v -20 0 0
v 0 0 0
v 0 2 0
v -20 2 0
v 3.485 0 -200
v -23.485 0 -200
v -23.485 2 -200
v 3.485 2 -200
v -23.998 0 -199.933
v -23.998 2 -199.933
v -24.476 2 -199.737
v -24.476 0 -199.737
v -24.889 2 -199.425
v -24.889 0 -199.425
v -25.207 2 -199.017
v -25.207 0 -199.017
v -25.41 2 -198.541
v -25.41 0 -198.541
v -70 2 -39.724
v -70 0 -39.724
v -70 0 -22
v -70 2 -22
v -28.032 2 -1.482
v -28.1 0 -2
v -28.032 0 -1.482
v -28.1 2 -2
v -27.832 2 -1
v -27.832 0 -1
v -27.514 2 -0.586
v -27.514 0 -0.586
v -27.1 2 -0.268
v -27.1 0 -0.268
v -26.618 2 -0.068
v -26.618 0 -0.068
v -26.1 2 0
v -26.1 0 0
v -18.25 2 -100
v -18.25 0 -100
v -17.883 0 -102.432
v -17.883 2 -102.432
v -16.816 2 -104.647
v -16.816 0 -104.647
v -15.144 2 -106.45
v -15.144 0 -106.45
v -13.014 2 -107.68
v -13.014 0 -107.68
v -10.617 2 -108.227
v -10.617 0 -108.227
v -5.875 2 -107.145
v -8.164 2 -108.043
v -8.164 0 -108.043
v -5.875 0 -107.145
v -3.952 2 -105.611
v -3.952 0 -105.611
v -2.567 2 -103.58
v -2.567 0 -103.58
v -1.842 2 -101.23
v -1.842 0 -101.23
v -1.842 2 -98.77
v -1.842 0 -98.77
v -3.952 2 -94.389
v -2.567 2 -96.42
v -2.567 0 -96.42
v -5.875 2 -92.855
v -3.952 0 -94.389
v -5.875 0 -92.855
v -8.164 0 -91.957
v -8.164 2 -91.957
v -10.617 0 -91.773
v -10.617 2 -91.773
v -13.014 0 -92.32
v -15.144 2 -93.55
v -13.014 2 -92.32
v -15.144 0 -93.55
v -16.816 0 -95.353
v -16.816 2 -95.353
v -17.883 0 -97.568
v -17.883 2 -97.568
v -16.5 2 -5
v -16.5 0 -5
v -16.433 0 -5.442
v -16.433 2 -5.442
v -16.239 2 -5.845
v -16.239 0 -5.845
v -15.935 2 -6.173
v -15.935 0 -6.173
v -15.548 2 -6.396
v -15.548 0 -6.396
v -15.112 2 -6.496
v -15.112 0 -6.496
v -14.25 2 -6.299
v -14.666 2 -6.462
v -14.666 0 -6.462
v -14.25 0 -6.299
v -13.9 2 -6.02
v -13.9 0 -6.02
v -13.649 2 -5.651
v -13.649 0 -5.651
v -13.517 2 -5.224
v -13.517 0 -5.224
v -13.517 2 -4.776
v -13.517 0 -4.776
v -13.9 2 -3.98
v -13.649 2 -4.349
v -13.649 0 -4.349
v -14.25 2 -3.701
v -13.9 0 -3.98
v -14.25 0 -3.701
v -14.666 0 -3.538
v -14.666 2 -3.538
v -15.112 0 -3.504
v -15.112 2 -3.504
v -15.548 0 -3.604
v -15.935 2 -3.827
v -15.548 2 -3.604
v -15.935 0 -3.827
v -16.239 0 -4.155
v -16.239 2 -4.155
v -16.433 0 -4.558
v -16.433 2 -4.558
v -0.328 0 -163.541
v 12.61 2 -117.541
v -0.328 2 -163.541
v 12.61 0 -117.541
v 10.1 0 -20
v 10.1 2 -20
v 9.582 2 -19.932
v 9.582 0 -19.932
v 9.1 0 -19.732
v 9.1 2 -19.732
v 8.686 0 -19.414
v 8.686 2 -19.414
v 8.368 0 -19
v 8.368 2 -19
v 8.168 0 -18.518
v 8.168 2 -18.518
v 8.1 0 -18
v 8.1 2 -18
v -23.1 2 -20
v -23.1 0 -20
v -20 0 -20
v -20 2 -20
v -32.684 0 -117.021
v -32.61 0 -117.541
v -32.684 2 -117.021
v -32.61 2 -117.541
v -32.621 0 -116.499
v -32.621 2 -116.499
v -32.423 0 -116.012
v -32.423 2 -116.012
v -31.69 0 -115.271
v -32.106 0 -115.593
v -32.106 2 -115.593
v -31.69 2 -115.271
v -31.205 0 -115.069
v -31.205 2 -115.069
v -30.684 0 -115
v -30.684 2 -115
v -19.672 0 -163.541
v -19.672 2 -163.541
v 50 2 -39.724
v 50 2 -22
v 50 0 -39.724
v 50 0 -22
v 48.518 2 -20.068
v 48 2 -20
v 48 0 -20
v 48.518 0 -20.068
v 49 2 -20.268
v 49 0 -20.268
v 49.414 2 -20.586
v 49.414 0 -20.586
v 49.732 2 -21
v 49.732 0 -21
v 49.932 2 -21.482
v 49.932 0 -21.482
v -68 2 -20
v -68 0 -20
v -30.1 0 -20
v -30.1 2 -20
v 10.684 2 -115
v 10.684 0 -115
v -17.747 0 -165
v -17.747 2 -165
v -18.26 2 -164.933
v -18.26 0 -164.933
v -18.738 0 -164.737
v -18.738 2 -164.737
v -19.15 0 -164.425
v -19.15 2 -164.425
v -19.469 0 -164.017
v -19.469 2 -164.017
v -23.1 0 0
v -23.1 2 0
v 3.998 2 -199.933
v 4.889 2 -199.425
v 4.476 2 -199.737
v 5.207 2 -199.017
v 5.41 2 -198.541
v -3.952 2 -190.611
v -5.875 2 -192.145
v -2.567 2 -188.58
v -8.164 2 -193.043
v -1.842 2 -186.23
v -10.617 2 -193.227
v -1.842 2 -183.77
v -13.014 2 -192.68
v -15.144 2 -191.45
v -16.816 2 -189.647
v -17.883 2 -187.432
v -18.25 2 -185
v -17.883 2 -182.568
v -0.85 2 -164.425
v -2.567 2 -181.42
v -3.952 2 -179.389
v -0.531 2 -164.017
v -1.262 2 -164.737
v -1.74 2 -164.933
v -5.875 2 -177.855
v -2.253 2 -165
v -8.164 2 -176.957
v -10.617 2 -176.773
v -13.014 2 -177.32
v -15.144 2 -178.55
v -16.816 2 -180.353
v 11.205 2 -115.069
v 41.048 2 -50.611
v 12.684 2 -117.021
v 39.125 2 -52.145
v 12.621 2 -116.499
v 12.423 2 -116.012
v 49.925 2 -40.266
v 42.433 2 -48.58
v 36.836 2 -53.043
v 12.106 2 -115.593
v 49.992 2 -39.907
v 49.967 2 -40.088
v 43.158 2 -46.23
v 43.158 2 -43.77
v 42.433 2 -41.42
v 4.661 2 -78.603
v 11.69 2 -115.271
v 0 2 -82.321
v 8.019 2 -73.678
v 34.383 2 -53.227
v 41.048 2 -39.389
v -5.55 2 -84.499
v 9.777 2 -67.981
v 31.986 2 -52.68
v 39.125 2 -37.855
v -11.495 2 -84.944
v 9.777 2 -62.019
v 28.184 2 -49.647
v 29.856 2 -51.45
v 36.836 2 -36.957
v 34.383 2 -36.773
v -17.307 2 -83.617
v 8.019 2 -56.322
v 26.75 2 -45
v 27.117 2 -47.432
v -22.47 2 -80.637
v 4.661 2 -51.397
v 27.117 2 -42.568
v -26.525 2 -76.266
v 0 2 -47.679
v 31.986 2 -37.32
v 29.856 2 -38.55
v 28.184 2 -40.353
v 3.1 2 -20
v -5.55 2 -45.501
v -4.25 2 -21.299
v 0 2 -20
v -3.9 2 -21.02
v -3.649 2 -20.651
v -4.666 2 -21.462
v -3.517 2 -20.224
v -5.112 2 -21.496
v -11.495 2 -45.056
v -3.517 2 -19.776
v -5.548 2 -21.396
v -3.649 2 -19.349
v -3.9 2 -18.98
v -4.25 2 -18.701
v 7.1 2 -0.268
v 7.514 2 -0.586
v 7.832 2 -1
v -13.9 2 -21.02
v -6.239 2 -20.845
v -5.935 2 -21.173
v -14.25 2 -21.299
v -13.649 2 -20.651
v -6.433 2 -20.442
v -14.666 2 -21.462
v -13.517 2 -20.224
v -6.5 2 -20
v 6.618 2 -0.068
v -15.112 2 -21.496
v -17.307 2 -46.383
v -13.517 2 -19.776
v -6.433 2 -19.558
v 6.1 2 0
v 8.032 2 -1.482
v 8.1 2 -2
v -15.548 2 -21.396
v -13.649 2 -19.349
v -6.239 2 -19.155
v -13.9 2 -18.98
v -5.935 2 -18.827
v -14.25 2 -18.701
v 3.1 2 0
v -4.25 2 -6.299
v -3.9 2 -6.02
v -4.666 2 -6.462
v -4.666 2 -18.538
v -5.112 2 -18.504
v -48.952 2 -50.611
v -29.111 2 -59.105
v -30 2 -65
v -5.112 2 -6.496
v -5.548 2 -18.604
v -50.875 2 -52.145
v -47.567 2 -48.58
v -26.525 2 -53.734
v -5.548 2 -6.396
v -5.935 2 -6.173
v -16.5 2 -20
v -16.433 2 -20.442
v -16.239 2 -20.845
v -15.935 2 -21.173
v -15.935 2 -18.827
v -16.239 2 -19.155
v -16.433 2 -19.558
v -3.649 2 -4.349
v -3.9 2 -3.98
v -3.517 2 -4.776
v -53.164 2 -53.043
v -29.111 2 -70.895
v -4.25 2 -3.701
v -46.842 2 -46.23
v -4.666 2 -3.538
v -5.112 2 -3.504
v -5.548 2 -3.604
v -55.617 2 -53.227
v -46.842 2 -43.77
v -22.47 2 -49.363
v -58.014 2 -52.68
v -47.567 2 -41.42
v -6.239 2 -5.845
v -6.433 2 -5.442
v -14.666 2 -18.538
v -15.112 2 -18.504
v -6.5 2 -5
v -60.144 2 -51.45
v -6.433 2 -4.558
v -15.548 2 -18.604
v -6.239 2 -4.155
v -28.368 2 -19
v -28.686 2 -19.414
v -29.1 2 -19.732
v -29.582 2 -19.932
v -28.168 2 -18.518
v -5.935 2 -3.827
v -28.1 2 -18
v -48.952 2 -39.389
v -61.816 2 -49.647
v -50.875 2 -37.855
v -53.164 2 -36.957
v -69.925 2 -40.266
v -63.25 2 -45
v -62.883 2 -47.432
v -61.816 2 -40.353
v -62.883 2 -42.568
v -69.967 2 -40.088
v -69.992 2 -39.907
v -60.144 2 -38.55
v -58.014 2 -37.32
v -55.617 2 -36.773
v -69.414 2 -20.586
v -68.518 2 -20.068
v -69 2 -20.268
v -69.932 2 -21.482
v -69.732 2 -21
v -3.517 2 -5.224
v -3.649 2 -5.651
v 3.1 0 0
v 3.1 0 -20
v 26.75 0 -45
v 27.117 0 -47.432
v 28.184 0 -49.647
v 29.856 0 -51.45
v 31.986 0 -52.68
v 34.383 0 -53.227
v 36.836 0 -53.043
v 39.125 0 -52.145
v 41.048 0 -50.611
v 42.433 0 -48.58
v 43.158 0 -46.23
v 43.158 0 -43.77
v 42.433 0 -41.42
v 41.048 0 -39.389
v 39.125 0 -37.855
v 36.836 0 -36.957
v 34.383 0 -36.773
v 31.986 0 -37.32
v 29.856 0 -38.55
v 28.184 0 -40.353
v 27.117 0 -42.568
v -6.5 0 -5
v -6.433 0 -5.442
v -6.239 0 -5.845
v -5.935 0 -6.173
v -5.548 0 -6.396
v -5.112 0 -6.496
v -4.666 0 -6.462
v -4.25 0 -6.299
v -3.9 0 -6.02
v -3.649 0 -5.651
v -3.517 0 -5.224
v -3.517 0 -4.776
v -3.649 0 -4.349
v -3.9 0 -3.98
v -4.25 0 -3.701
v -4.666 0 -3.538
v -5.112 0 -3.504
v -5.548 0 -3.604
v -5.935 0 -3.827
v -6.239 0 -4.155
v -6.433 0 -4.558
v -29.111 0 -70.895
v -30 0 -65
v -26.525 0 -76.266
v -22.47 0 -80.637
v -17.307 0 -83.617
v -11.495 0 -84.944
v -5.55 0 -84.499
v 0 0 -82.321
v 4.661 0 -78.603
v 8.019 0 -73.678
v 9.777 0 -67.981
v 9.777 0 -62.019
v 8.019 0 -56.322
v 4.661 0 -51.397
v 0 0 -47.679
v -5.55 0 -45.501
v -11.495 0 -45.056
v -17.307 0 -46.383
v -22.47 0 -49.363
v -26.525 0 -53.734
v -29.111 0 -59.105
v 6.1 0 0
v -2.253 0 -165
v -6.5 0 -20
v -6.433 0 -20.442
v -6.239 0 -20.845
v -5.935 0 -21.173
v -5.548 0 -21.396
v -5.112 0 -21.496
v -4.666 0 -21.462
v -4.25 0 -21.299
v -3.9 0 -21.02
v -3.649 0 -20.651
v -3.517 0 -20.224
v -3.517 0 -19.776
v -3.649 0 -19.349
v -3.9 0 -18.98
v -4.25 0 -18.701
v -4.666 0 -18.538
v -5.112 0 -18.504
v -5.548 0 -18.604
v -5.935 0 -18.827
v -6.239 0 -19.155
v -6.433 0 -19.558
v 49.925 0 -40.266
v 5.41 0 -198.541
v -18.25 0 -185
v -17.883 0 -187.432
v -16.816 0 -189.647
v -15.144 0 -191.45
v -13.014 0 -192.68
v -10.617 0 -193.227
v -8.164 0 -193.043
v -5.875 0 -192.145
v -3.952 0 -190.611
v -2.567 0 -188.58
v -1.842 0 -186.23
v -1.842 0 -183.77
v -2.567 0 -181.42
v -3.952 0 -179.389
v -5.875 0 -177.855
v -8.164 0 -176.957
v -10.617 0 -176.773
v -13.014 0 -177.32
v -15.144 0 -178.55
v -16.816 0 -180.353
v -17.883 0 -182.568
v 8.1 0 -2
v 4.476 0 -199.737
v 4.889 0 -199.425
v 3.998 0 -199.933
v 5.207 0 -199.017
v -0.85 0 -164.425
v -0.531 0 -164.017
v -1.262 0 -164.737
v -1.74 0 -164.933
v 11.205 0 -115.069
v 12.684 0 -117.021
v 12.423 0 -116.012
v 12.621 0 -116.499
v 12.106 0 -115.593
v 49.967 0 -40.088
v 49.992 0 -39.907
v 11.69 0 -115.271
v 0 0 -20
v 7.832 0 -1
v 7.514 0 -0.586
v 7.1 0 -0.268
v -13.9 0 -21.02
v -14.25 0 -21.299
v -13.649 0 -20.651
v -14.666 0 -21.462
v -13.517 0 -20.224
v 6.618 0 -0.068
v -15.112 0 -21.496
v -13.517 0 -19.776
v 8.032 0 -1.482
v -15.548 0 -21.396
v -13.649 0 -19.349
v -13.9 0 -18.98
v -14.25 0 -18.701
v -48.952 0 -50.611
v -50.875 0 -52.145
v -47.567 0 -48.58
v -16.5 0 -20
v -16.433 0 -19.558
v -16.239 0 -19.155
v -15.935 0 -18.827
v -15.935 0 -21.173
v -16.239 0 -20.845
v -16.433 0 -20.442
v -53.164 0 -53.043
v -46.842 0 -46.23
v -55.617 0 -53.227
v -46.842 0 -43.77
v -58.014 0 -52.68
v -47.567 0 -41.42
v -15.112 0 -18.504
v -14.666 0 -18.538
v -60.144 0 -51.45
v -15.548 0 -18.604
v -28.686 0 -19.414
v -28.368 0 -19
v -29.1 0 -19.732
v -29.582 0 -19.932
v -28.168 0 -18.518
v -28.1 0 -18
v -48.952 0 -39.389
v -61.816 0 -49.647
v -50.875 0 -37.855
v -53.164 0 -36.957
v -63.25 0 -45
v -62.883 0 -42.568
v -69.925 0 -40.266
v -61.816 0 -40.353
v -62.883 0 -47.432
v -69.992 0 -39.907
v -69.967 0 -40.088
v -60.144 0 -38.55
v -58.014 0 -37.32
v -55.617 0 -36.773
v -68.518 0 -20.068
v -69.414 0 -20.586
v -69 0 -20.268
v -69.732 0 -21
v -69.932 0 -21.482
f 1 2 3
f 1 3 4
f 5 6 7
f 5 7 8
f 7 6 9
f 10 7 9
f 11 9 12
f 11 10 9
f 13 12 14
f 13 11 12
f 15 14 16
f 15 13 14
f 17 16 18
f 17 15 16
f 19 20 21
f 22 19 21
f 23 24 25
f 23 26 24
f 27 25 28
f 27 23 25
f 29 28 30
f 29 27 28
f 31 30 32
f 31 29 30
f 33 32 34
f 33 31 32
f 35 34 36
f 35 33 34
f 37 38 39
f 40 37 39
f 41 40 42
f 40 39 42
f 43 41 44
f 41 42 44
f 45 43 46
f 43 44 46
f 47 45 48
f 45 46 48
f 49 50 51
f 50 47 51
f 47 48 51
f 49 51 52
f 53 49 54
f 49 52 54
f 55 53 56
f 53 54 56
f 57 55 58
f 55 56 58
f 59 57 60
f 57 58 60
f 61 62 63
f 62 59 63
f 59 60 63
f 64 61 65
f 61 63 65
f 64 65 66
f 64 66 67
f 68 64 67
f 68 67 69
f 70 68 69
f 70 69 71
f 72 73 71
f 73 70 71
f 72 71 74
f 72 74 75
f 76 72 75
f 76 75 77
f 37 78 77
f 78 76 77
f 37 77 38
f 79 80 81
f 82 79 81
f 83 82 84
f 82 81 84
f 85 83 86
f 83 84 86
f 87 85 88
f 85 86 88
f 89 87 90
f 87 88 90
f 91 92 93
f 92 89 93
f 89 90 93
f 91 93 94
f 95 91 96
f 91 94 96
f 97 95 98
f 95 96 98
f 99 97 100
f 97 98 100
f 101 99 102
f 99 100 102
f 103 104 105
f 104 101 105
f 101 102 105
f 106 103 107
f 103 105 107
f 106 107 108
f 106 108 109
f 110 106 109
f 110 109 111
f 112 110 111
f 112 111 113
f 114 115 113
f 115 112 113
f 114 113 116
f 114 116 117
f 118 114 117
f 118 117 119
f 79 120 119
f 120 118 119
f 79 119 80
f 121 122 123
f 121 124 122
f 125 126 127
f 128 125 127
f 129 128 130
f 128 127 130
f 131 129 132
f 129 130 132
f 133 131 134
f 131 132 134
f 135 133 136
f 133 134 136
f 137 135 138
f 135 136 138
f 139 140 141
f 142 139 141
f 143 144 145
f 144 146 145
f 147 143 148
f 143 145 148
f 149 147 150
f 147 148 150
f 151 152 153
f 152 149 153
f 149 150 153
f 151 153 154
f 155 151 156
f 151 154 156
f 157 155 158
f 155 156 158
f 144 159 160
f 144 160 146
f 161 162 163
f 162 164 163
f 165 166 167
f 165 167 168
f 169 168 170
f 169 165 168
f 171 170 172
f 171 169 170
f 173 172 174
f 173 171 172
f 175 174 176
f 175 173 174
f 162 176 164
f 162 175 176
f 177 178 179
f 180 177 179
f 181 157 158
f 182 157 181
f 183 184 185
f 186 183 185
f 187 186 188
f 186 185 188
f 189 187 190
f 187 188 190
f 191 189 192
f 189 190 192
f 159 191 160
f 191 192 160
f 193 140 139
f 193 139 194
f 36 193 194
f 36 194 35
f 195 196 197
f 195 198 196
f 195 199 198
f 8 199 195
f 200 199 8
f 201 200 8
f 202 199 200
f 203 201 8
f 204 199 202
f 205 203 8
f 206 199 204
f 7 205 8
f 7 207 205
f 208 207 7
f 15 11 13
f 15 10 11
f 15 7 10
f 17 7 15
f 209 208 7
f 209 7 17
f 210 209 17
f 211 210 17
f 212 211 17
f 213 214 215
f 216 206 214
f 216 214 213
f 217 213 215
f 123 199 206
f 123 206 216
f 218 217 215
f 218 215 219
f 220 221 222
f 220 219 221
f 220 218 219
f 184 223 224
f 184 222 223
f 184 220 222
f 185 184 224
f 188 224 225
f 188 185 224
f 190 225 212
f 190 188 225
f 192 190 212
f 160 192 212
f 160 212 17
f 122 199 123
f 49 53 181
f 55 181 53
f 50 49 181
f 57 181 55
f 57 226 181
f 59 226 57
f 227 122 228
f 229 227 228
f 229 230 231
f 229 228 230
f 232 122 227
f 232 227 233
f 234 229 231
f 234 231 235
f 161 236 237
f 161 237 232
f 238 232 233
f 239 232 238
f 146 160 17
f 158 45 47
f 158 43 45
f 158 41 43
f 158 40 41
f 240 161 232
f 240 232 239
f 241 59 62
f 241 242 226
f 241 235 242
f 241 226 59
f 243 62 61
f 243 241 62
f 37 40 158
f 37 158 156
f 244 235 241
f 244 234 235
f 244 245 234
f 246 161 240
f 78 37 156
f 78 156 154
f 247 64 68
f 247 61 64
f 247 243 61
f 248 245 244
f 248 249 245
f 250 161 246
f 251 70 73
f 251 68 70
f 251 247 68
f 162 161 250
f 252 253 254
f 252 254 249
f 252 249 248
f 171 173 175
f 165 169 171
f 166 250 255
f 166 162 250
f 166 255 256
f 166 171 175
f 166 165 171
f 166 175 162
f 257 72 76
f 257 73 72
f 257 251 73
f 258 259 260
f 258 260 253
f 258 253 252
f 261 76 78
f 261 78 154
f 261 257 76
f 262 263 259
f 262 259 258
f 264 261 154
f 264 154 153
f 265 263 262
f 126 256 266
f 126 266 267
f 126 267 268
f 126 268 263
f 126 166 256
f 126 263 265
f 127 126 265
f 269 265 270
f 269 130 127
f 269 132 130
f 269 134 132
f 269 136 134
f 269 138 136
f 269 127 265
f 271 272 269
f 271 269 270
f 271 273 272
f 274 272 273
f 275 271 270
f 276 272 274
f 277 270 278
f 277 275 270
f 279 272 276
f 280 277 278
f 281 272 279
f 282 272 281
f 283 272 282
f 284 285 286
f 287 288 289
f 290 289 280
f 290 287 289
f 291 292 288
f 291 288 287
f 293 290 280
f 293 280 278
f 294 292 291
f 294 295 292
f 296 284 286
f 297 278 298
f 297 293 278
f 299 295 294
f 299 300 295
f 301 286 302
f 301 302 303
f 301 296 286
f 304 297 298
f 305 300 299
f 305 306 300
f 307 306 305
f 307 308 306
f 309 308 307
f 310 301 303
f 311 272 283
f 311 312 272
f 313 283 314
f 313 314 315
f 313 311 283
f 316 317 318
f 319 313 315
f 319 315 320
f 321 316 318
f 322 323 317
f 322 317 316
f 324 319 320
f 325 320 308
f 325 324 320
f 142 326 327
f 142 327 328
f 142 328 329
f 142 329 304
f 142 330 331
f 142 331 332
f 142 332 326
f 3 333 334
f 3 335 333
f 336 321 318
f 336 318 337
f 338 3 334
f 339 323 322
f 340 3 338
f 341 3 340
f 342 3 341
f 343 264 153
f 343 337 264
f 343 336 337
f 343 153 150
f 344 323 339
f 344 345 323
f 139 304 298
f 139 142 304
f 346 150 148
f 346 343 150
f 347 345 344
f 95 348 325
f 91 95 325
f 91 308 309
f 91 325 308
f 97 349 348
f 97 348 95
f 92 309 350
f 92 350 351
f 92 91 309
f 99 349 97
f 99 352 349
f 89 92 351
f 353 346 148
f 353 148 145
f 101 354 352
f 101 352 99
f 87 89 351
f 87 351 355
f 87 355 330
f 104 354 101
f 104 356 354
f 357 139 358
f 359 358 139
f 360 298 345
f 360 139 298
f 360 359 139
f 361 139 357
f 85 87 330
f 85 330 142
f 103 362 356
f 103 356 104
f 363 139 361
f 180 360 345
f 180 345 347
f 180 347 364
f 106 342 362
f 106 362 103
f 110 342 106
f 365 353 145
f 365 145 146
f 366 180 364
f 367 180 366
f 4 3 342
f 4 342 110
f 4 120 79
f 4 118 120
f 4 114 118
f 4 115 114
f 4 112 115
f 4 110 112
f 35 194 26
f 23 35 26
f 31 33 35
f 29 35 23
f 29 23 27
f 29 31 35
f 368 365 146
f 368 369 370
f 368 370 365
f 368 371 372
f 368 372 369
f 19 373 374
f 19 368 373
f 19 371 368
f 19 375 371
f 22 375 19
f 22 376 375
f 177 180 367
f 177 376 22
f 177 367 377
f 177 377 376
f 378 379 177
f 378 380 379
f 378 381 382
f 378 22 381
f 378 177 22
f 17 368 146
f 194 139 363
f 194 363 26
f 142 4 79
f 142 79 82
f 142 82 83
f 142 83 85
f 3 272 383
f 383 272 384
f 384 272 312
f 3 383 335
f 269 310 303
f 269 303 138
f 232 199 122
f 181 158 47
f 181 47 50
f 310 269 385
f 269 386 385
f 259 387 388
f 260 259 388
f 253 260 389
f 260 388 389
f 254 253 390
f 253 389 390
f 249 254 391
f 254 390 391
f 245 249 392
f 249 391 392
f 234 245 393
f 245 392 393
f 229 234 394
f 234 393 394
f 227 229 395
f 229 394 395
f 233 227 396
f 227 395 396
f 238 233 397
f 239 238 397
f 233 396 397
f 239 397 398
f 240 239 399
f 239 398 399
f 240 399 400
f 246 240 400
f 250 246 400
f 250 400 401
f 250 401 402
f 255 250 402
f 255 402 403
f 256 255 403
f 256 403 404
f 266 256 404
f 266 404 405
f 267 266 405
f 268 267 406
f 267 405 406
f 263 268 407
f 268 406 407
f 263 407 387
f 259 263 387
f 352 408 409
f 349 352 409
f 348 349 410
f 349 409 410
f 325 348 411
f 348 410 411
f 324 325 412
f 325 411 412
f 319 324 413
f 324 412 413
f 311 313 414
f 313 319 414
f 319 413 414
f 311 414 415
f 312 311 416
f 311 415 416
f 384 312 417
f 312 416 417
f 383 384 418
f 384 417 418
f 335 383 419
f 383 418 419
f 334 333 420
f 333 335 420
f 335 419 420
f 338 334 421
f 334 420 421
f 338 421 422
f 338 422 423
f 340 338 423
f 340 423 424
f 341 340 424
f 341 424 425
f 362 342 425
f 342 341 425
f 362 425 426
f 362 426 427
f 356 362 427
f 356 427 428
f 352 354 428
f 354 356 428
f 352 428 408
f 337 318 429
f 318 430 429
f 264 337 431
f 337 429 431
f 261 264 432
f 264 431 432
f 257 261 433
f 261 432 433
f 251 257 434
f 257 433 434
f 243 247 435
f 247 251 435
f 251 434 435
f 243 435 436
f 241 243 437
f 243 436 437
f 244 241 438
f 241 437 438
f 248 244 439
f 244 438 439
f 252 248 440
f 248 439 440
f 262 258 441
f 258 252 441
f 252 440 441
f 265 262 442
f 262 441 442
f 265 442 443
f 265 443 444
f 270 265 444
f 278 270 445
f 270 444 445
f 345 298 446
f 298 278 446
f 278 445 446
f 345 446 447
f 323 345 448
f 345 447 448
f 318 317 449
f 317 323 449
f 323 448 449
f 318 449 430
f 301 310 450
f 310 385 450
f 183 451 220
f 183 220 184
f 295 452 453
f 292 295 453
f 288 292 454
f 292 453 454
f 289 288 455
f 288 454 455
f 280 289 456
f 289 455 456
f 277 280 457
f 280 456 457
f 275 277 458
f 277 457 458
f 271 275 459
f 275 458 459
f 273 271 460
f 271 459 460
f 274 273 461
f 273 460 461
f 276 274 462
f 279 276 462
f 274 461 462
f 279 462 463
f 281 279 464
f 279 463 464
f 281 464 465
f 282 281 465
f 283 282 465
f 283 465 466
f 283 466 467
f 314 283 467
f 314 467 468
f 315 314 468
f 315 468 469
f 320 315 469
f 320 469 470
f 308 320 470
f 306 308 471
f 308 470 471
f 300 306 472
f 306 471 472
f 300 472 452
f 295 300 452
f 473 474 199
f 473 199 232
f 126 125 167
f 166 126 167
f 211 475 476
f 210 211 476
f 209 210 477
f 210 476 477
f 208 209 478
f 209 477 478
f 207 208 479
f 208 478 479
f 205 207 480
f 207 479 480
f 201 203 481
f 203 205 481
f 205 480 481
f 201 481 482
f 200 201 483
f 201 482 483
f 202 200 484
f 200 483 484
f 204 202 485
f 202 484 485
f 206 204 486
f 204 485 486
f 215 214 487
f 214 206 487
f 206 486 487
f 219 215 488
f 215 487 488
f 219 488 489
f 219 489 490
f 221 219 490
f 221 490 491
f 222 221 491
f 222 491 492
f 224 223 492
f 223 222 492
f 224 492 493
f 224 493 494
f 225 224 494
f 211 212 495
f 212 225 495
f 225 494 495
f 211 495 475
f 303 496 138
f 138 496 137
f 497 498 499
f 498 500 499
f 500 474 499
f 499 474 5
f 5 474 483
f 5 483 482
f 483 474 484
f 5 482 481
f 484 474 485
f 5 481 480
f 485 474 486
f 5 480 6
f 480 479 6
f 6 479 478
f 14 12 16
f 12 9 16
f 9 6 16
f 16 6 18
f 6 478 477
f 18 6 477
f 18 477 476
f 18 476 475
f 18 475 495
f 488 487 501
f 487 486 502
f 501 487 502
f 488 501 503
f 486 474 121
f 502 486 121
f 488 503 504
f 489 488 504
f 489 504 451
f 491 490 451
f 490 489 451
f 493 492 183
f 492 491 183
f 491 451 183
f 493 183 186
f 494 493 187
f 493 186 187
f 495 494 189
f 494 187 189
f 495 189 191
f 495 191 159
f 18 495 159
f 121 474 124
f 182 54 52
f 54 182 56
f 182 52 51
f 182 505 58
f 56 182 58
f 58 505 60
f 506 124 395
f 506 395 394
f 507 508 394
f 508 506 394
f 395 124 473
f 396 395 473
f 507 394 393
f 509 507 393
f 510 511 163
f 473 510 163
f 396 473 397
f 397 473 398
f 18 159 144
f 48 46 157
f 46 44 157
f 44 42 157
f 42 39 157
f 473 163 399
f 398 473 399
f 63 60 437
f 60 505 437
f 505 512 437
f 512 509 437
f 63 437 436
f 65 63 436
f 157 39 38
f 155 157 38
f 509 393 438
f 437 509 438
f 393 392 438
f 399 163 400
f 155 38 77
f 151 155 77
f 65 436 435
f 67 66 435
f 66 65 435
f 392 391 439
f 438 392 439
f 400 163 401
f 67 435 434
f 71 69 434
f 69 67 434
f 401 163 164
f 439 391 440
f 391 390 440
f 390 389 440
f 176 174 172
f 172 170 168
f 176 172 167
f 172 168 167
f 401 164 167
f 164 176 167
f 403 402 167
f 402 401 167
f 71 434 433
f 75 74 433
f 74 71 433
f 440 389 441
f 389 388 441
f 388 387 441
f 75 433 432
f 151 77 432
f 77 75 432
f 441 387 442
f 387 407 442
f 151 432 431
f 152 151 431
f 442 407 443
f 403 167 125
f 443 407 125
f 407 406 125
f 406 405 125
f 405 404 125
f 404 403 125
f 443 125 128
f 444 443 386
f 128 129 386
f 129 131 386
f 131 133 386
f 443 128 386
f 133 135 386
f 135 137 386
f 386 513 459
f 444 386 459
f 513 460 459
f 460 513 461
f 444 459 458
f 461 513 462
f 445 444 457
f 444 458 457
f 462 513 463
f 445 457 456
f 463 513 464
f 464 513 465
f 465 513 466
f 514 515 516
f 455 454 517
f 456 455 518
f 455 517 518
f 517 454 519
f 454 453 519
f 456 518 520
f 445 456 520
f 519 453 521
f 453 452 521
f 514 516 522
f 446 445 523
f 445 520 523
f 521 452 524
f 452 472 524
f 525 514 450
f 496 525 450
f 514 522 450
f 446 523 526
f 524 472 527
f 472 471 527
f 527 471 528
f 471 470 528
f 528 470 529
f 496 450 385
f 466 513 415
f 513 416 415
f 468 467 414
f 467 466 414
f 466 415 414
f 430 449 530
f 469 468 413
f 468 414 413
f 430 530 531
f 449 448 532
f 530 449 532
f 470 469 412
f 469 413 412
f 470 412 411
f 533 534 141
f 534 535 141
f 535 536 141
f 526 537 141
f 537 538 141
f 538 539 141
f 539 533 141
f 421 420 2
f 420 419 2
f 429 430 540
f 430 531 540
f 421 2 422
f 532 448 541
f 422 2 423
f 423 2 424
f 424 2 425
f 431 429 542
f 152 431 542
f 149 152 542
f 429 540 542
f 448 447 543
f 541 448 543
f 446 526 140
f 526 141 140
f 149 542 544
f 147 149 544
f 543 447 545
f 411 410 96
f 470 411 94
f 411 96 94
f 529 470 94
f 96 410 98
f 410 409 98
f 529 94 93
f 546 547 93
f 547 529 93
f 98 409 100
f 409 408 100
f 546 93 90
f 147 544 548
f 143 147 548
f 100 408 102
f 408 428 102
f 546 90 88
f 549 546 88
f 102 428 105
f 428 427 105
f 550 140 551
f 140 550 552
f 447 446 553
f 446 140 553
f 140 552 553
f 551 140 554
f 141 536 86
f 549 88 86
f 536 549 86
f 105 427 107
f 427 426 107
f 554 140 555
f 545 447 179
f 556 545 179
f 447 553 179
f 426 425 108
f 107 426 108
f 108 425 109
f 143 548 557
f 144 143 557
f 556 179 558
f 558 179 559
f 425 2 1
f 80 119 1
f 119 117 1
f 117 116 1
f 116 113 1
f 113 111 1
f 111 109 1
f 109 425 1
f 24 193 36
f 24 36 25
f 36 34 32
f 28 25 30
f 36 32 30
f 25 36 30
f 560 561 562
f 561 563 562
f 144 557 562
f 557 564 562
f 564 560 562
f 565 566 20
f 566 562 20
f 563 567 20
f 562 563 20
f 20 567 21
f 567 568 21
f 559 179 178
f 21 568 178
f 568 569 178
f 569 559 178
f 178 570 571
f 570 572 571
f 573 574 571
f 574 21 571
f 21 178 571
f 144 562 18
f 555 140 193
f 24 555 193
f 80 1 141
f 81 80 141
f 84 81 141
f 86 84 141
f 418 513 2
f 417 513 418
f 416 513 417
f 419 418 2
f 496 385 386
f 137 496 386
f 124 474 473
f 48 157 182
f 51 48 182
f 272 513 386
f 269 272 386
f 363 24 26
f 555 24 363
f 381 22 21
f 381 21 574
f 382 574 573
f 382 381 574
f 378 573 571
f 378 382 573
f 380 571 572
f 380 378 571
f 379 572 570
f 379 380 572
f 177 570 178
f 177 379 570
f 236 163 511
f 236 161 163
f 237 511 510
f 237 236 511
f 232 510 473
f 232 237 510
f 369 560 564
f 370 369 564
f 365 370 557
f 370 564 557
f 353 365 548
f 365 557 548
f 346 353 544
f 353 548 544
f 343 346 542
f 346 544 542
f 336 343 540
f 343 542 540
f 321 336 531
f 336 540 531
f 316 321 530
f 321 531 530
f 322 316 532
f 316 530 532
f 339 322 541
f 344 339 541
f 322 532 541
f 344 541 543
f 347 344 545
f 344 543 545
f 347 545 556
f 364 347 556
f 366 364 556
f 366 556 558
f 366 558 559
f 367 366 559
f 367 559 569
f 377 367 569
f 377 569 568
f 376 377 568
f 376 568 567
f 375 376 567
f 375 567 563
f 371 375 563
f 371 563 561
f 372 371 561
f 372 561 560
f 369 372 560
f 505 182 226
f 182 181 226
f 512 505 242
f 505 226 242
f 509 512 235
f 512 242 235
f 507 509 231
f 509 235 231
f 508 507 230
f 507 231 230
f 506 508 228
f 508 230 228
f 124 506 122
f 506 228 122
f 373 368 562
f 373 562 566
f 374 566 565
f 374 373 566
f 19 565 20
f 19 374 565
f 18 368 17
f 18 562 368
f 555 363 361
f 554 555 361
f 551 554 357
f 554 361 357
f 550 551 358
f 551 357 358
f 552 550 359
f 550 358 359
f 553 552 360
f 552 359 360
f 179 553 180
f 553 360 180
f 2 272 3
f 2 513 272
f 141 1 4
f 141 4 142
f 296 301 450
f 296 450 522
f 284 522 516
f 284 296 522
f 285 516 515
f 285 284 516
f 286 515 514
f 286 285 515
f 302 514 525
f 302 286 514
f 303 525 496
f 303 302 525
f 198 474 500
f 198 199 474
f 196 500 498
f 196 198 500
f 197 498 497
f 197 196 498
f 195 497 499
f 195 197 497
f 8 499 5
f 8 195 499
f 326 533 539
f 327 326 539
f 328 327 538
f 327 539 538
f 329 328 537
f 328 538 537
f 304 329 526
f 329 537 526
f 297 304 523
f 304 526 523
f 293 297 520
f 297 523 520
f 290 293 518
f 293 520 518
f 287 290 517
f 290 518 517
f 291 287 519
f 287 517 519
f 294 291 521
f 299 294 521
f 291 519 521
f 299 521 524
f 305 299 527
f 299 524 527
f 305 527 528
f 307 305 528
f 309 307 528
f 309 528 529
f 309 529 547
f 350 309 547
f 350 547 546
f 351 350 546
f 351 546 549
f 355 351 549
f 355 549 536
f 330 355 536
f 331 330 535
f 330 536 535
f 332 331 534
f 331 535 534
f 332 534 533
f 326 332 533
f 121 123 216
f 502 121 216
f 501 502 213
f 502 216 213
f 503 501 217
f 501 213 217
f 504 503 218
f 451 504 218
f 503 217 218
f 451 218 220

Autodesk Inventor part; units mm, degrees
ref_plane "YZ Plane" through (0, 0, 0) normal (1, 0, 0) x (0, 1, 0)
ref_plane "XZ Plane" through (0, 0, 0) normal (0, 1, 0) x (-1, 0, 0)
ref_plane "XY Plane" through (0, 0, 0) normal (0, 0, 1) x (1, 0, 0)
sketch "Sketch1" plane through (0, 0, 0) normal (0, 1, 0) x (-1, 0, 0)
  line L0 (0, 0) -> (20, 0)
  line L1 (20, 0) -> (20, -20)
  line L2 (20, -20) -> (0, -20)
  line L3 (0, -20) -> (0, 0)
  line L4 (70, -20) -> (-50, -20)
  line L5 (-50, -20) -> (-50, -40)
  line L6 (-50, -40) -> (70, -40)
  line L7 (70, -40) -> (70, -20)
  line L8 (10, 0) -> (10, -20) construction
  line L9 (70, -40) -> (25, -200)
  line L10 (25, -200) -> (-5, -200)
  line L11 (-5, -200) -> (-50, -40)
  circle A0 centre (55, -45) radius 8.25
  circle A1 centre (-35, -45) radius 8.25
  circle A2 centre (10, -185) radius 8.25
  circle A3 centre (10, -100) radius 8.25
  circle A4 centre (15, -5) radius 1.5
  circle A5 centre (15, -20) radius 1.5
  circle A6 centre (5, -5) radius 1.5
  circle A7 centre (5, -20) radius 1.5
  line L12 (28.1, -20) -> (23.1, -20)
  line L13 (23.1, -20) -> (23.1, 0)
  line L14 (23.1, 0) -> (28.1, 0)
  line L15 (28.1, 0) -> (28.1, -20)
  line L16 (-8.1, -20) -> (-3.1, -20)
  line L17 (-3.1, -20) -> (-3.1, 0)
  line L18 (-3.1, 0) -> (-8.1, 0)
  line L19 (-8.1, 0) -> (-8.1, -20)
  line L20 (33.3243, -115) -> (-13.3243, -115)
  line L21 (-13.3243, -115) -> (0.7382, -165)
  line L22 (0.7382, -165) -> (19.2618, -165)
  line L23 (19.2618, -165) -> (33.3243, -115)
  circle A8 centre (10, -65) radius 20
  point P0 (10, -10)
  point P1 (20, -20)
  point P2 (0, -20)
  point P3 (-3.1, -20)
  point P4 (23.1, -20)
  point P5 (10, -40)
  point P6 (-5, -40)
  dimension "d0" = 20
  dimension "d1" = 20
  dimension "d2" = 120
  dimension "d3" = 60
  dimension "d4" = 20
  dimension "d6" = 200
  dimension "d7" = 45
  dimension "d8" = 45
  dimension "d9" = 16.5
  dimension "d10" = 16.5
  dimension "d11" = 16.5
  dimension "d12" = 16.5
  dimension "d13" = 15
  dimension "d14" = 15
  dimension "d15" = 25
  dimension "d16" = 25
  dimension "d17" = 15
  dimension "d18" = 100
  dimension "d23" = 3
  dimension "d24" = 3
  dimension "d25" = 3
  dimension "d26" = 3
  dimension "d27" = 5
  dimension "d28" = 5
  dimension "d29" = 5
  dimension "d30" = 5
  dimension "d31" = 0
  dimension "d32" = 0
  dimension "d33" = 5
  dimension "d34" = 5
  dimension "d38" = 3.1
  dimension "d39" = 3.1
  dimension "d40" = 5
  dimension "d41" = 5
  dimension "d56" = 15
  dimension "d57" = 15
  dimension "d58" = 20
  dimension "d59" = 15
  dimension "d64" = 40
  dimension "d66" = 35
extrude "Extrusion1" add sketch "Sketch1" along normal blind 2 contours L0 L1 L2 A5 A7 L3 | L2 A7 A5 L4 L7 L6 A0 A1 L5 | L4 L19 L18 L17 | L13 L14 L15 L4 | L6 A1 A0 L9 L10 L11
fillet "Fillet1" radius 2 14 edges at (-70, 1, -20) (50, 1, -20) (-25, 1, -200) (5, 1, -200) (-28.1, 1, 0) (8.1, 1, 0) (-28.1, 1, -20) (8.1, 1, -20) (50, 1, -40) (-70, 1, -40) (-33.3243, 1, -115) (13.3243, 1, -115) (-0.7382, 1, -165) (-19.2618, 1, -165)
sketch "Sketch6" plane through (0, 2, 0) normal (0, 1, 0) x (1, 0, 0)
  arc A0 (-69.9253, 40.2656) -> (-70, 39.7241) centre (-68, 39.7241) ccw projected
  line L0 (-70, 39.7241) -> (-70, 22) projected
  arc A1 (-70, 22) -> (-68, 20) centre (-68, 22) ccw projected
  line L1 (-68, 20) -> (-30.1, 20) projected
  arc A2 (-28.1, 18) -> (-30.1, 20) centre (-30.1, 18) ccw projected
  line L2 (-28.1, 18) -> (-28.1, 2) projected
  arc A3 (-28.1, 2) -> (-26.1, 0) centre (-26.1, 2) ccw projected
  line L3 (-26.1, 0) -> (-23.1, 0) projected
  line L4 (-23.1, 0) -> (-23.1, 20) projected
  line L5 (-23.1, 20) -> (-20, 20) projected
  line L6 (-20, 20) -> (-20, 0) projected
  line L7 (-20, 0) -> (0, 0) projected
  line L8 (0, 0) -> (0, 20) projected
  line L9 (0, 20) -> (3.1, 20) projected
  line L10 (3.1, 20) -> (3.1, 0) projected
  line L11 (3.1, 0) -> (6.1, 0) projected
  arc A4 (6.1, 0) -> (8.1, 2) centre (6.1, 2) ccw projected
  line L12 (8.1, 2) -> (8.1, 18) projected
  arc A5 (10.1, 20) -> (8.1, 18) centre (10.1, 18) ccw projected
  line L13 (10.1, 20) -> (48, 20) projected
  arc A6 (48, 20) -> (50, 22) centre (48, 22) ccw projected
  line L14 (50, 22) -> (50, 39.7241) projected
  arc A7 (50, 39.7241) -> (49.9253, 40.2656) centre (48, 39.7241) ccw projected
  line L15 (49.9253, 40.2656) -> (5.4102, 198.5415) projected
  arc A8 (5.4102, 198.5415) -> (3.4849, 200) centre (3.4849, 198) ccw projected
  line L16 (3.4849, 200) -> (-23.4849, 200) projected
  arc A9 (-23.4849, 200) -> (-25.4102, 198.5415) centre (-23.4849, 198) ccw projected
  line L17 (-25.4102, 198.5415) -> (-69.9253, 40.2656) projected
  circle A10 centre (-5, 20) radius 1.5 projected
  circle A11 centre (-5, 5) radius 1.5 projected
  circle A12 centre (-15, 5) radius 1.5 projected
  circle A13 centre (-15, 20) radius 1.5 projected
  circle A14 centre (35, 45) radius 8.25 projected
  circle A15 centre (-10, 65) radius 20 projected
  circle A16 centre (-55, 45) radius 8.25 projected
  circle A17 centre (-10, 185) radius 8.25 projected
  circle A18 centre (-10, 100) radius 8.25 projected
  line L18 (-32.6095, 117.5415) -> (-19.672, 163.5415) projected
  arc A19 (-17.7467, 165) -> (-19.672, 163.5415) centre (-17.7467, 163) ccw projected
  line L19 (-17.7467, 165) -> (-2.2533, 165) projected
  arc A20 (-0.328, 163.5415) -> (-2.2533, 165) centre (-2.2533, 163) ccw projected
  line L20 (-0.328, 163.5415) -> (12.6095, 117.5415) projected
  arc A21 (10.6842, 115) -> (12.6095, 117.5415) centre (10.6842, 117) ccw projected
  line L21 (10.6842, 115) -> (-30.6842, 115) projected
  arc A22 (-32.6095, 117.5415) -> (-30.6842, 115) centre (-30.6842, 117) ccw projected
  dimension "d67" = 16.2
  dimension "d68" = 16.2
  dimension "d69" = 16.2
  dimension "d70" = 16.2
  dimension "d71" = 3
  dimension "d72" = 3
  dimension "d73" = 3
  dimension "d74" = 3
sketch "Sketch8" plane through (0, 2, 0) normal (0, 1, 0) x (1, 0, 0)
  circle A0 centre (-10, 185) radius 11.25 projected
  circle A1 centre (-10, 100) radius 11.25 projected
  circle A2 centre (35, 45) radius 11.25 projected
  circle A3 centre (-55, 45) radius 11.25 projected
  arc A4 (-69.9253, 40.2656) -> (-70, 39.7241) centre (-68, 39.7241) ccw projected
  line L0 (-70, 39.7241) -> (-70, 22) projected
  arc A5 (-70, 22) -> (-68, 20) centre (-68, 22) ccw projected
  line L1 (-68, 20) -> (-30.1, 20) projected
  arc A6 (-28.1, 18) -> (-30.1, 20) centre (-30.1, 18) ccw projected
  line L2 (-28.1, 18) -> (-28.1, 2) projected
  arc A7 (-28.1, 2) -> (-26.1, 0) centre (-26.1, 2) ccw projected
  line L3 (-26.1, 0) -> (-23.1, 0) projected
  line L4 (-23.1, 0) -> (-23.1, 20) projected
  line L5 (-23.1, 20) -> (-20, 20) projected
  line L6 (-20, 20) -> (-20, 0) projected
  line L7 (-20, 0) -> (0, 0) projected
  line L8 (0, 0) -> (0, 20) projected
  line L9 (0, 20) -> (3.1, 20) projected
  line L10 (3.1, 20) -> (3.1, 0) projected
  line L11 (3.1, 0) -> (6.1, 0) projected
  arc A8 (6.1, 0) -> (8.1, 2) centre (6.1, 2) ccw projected
  line L12 (8.1, 2) -> (8.1, 18) projected
  arc A9 (10.1, 20) -> (8.1, 18) centre (10.1, 18) ccw projected
  line L13 (10.1, 20) -> (48, 20) projected
  arc A10 (48, 20) -> (50, 22) centre (48, 22) ccw projected
  line L14 (50, 22) -> (50, 39.7241) projected
  arc A11 (50, 39.7241) -> (49.9253, 40.2656) centre (48, 39.7241) ccw projected
  line L15 (49.9253, 40.2656) -> (5.4102, 198.5415) projected
  arc A12 (5.4102, 198.5415) -> (3.4849, 200) centre (3.4849, 198) ccw projected
  line L16 (3.4849, 200) -> (-23.4849, 200) projected
  arc A13 (-23.4849, 200) -> (-25.4102, 198.5415) centre (-23.4849, 198) ccw projected
  line L17 (-25.4102, 198.5415) -> (-69.9253, 40.2656) projected
  circle A14 centre (-5, 20) radius 1.5 projected
  circle A15 centre (-5, 5) radius 1.5 projected
  circle A16 centre (-15, 5) radius 1.5 projected
  circle A17 centre (-15, 20) radius 1.5 projected
  circle A18 centre (-10, 65) radius 20 projected
  line L18 (-32.6095, 117.5415) -> (-19.672, 163.5415) projected
  arc A19 (-17.7467, 165) -> (-19.672, 163.5415) centre (-17.7467, 163) ccw projected
  line L19 (-17.7467, 165) -> (-2.2533, 165) projected
  arc A20 (-0.328, 163.5415) -> (-2.2533, 165) centre (-2.2533, 163) ccw projected
  line L20 (-0.328, 163.5415) -> (12.6095, 117.5415) projected
  arc A21 (10.6842, 115) -> (12.6095, 117.5415) centre (10.6842, 117) ccw projected
  line L21 (10.6842, 115) -> (-30.6842, 115) projected
  arc A22 (-32.6095, 117.5415) -> (-30.6842, 115) centre (-30.6842, 117) ccw projected
  circle A23 centre (-15, 5) radius 1.6
  circle A24 centre (-15, 20) radius 1.6
  circle A25 centre (-5, 20) radius 1.6
  circle A26 centre (-5, 5) radius 1.6
  dimension "d79" = 0.1
  dimension "d80" = 0.1
  dimension "d81" = 0.1
  dimension "d82" = 0.1
equation "\"d3\" = 0.5 * d2"
properties part number "Foam_wing_mount_clamp"
